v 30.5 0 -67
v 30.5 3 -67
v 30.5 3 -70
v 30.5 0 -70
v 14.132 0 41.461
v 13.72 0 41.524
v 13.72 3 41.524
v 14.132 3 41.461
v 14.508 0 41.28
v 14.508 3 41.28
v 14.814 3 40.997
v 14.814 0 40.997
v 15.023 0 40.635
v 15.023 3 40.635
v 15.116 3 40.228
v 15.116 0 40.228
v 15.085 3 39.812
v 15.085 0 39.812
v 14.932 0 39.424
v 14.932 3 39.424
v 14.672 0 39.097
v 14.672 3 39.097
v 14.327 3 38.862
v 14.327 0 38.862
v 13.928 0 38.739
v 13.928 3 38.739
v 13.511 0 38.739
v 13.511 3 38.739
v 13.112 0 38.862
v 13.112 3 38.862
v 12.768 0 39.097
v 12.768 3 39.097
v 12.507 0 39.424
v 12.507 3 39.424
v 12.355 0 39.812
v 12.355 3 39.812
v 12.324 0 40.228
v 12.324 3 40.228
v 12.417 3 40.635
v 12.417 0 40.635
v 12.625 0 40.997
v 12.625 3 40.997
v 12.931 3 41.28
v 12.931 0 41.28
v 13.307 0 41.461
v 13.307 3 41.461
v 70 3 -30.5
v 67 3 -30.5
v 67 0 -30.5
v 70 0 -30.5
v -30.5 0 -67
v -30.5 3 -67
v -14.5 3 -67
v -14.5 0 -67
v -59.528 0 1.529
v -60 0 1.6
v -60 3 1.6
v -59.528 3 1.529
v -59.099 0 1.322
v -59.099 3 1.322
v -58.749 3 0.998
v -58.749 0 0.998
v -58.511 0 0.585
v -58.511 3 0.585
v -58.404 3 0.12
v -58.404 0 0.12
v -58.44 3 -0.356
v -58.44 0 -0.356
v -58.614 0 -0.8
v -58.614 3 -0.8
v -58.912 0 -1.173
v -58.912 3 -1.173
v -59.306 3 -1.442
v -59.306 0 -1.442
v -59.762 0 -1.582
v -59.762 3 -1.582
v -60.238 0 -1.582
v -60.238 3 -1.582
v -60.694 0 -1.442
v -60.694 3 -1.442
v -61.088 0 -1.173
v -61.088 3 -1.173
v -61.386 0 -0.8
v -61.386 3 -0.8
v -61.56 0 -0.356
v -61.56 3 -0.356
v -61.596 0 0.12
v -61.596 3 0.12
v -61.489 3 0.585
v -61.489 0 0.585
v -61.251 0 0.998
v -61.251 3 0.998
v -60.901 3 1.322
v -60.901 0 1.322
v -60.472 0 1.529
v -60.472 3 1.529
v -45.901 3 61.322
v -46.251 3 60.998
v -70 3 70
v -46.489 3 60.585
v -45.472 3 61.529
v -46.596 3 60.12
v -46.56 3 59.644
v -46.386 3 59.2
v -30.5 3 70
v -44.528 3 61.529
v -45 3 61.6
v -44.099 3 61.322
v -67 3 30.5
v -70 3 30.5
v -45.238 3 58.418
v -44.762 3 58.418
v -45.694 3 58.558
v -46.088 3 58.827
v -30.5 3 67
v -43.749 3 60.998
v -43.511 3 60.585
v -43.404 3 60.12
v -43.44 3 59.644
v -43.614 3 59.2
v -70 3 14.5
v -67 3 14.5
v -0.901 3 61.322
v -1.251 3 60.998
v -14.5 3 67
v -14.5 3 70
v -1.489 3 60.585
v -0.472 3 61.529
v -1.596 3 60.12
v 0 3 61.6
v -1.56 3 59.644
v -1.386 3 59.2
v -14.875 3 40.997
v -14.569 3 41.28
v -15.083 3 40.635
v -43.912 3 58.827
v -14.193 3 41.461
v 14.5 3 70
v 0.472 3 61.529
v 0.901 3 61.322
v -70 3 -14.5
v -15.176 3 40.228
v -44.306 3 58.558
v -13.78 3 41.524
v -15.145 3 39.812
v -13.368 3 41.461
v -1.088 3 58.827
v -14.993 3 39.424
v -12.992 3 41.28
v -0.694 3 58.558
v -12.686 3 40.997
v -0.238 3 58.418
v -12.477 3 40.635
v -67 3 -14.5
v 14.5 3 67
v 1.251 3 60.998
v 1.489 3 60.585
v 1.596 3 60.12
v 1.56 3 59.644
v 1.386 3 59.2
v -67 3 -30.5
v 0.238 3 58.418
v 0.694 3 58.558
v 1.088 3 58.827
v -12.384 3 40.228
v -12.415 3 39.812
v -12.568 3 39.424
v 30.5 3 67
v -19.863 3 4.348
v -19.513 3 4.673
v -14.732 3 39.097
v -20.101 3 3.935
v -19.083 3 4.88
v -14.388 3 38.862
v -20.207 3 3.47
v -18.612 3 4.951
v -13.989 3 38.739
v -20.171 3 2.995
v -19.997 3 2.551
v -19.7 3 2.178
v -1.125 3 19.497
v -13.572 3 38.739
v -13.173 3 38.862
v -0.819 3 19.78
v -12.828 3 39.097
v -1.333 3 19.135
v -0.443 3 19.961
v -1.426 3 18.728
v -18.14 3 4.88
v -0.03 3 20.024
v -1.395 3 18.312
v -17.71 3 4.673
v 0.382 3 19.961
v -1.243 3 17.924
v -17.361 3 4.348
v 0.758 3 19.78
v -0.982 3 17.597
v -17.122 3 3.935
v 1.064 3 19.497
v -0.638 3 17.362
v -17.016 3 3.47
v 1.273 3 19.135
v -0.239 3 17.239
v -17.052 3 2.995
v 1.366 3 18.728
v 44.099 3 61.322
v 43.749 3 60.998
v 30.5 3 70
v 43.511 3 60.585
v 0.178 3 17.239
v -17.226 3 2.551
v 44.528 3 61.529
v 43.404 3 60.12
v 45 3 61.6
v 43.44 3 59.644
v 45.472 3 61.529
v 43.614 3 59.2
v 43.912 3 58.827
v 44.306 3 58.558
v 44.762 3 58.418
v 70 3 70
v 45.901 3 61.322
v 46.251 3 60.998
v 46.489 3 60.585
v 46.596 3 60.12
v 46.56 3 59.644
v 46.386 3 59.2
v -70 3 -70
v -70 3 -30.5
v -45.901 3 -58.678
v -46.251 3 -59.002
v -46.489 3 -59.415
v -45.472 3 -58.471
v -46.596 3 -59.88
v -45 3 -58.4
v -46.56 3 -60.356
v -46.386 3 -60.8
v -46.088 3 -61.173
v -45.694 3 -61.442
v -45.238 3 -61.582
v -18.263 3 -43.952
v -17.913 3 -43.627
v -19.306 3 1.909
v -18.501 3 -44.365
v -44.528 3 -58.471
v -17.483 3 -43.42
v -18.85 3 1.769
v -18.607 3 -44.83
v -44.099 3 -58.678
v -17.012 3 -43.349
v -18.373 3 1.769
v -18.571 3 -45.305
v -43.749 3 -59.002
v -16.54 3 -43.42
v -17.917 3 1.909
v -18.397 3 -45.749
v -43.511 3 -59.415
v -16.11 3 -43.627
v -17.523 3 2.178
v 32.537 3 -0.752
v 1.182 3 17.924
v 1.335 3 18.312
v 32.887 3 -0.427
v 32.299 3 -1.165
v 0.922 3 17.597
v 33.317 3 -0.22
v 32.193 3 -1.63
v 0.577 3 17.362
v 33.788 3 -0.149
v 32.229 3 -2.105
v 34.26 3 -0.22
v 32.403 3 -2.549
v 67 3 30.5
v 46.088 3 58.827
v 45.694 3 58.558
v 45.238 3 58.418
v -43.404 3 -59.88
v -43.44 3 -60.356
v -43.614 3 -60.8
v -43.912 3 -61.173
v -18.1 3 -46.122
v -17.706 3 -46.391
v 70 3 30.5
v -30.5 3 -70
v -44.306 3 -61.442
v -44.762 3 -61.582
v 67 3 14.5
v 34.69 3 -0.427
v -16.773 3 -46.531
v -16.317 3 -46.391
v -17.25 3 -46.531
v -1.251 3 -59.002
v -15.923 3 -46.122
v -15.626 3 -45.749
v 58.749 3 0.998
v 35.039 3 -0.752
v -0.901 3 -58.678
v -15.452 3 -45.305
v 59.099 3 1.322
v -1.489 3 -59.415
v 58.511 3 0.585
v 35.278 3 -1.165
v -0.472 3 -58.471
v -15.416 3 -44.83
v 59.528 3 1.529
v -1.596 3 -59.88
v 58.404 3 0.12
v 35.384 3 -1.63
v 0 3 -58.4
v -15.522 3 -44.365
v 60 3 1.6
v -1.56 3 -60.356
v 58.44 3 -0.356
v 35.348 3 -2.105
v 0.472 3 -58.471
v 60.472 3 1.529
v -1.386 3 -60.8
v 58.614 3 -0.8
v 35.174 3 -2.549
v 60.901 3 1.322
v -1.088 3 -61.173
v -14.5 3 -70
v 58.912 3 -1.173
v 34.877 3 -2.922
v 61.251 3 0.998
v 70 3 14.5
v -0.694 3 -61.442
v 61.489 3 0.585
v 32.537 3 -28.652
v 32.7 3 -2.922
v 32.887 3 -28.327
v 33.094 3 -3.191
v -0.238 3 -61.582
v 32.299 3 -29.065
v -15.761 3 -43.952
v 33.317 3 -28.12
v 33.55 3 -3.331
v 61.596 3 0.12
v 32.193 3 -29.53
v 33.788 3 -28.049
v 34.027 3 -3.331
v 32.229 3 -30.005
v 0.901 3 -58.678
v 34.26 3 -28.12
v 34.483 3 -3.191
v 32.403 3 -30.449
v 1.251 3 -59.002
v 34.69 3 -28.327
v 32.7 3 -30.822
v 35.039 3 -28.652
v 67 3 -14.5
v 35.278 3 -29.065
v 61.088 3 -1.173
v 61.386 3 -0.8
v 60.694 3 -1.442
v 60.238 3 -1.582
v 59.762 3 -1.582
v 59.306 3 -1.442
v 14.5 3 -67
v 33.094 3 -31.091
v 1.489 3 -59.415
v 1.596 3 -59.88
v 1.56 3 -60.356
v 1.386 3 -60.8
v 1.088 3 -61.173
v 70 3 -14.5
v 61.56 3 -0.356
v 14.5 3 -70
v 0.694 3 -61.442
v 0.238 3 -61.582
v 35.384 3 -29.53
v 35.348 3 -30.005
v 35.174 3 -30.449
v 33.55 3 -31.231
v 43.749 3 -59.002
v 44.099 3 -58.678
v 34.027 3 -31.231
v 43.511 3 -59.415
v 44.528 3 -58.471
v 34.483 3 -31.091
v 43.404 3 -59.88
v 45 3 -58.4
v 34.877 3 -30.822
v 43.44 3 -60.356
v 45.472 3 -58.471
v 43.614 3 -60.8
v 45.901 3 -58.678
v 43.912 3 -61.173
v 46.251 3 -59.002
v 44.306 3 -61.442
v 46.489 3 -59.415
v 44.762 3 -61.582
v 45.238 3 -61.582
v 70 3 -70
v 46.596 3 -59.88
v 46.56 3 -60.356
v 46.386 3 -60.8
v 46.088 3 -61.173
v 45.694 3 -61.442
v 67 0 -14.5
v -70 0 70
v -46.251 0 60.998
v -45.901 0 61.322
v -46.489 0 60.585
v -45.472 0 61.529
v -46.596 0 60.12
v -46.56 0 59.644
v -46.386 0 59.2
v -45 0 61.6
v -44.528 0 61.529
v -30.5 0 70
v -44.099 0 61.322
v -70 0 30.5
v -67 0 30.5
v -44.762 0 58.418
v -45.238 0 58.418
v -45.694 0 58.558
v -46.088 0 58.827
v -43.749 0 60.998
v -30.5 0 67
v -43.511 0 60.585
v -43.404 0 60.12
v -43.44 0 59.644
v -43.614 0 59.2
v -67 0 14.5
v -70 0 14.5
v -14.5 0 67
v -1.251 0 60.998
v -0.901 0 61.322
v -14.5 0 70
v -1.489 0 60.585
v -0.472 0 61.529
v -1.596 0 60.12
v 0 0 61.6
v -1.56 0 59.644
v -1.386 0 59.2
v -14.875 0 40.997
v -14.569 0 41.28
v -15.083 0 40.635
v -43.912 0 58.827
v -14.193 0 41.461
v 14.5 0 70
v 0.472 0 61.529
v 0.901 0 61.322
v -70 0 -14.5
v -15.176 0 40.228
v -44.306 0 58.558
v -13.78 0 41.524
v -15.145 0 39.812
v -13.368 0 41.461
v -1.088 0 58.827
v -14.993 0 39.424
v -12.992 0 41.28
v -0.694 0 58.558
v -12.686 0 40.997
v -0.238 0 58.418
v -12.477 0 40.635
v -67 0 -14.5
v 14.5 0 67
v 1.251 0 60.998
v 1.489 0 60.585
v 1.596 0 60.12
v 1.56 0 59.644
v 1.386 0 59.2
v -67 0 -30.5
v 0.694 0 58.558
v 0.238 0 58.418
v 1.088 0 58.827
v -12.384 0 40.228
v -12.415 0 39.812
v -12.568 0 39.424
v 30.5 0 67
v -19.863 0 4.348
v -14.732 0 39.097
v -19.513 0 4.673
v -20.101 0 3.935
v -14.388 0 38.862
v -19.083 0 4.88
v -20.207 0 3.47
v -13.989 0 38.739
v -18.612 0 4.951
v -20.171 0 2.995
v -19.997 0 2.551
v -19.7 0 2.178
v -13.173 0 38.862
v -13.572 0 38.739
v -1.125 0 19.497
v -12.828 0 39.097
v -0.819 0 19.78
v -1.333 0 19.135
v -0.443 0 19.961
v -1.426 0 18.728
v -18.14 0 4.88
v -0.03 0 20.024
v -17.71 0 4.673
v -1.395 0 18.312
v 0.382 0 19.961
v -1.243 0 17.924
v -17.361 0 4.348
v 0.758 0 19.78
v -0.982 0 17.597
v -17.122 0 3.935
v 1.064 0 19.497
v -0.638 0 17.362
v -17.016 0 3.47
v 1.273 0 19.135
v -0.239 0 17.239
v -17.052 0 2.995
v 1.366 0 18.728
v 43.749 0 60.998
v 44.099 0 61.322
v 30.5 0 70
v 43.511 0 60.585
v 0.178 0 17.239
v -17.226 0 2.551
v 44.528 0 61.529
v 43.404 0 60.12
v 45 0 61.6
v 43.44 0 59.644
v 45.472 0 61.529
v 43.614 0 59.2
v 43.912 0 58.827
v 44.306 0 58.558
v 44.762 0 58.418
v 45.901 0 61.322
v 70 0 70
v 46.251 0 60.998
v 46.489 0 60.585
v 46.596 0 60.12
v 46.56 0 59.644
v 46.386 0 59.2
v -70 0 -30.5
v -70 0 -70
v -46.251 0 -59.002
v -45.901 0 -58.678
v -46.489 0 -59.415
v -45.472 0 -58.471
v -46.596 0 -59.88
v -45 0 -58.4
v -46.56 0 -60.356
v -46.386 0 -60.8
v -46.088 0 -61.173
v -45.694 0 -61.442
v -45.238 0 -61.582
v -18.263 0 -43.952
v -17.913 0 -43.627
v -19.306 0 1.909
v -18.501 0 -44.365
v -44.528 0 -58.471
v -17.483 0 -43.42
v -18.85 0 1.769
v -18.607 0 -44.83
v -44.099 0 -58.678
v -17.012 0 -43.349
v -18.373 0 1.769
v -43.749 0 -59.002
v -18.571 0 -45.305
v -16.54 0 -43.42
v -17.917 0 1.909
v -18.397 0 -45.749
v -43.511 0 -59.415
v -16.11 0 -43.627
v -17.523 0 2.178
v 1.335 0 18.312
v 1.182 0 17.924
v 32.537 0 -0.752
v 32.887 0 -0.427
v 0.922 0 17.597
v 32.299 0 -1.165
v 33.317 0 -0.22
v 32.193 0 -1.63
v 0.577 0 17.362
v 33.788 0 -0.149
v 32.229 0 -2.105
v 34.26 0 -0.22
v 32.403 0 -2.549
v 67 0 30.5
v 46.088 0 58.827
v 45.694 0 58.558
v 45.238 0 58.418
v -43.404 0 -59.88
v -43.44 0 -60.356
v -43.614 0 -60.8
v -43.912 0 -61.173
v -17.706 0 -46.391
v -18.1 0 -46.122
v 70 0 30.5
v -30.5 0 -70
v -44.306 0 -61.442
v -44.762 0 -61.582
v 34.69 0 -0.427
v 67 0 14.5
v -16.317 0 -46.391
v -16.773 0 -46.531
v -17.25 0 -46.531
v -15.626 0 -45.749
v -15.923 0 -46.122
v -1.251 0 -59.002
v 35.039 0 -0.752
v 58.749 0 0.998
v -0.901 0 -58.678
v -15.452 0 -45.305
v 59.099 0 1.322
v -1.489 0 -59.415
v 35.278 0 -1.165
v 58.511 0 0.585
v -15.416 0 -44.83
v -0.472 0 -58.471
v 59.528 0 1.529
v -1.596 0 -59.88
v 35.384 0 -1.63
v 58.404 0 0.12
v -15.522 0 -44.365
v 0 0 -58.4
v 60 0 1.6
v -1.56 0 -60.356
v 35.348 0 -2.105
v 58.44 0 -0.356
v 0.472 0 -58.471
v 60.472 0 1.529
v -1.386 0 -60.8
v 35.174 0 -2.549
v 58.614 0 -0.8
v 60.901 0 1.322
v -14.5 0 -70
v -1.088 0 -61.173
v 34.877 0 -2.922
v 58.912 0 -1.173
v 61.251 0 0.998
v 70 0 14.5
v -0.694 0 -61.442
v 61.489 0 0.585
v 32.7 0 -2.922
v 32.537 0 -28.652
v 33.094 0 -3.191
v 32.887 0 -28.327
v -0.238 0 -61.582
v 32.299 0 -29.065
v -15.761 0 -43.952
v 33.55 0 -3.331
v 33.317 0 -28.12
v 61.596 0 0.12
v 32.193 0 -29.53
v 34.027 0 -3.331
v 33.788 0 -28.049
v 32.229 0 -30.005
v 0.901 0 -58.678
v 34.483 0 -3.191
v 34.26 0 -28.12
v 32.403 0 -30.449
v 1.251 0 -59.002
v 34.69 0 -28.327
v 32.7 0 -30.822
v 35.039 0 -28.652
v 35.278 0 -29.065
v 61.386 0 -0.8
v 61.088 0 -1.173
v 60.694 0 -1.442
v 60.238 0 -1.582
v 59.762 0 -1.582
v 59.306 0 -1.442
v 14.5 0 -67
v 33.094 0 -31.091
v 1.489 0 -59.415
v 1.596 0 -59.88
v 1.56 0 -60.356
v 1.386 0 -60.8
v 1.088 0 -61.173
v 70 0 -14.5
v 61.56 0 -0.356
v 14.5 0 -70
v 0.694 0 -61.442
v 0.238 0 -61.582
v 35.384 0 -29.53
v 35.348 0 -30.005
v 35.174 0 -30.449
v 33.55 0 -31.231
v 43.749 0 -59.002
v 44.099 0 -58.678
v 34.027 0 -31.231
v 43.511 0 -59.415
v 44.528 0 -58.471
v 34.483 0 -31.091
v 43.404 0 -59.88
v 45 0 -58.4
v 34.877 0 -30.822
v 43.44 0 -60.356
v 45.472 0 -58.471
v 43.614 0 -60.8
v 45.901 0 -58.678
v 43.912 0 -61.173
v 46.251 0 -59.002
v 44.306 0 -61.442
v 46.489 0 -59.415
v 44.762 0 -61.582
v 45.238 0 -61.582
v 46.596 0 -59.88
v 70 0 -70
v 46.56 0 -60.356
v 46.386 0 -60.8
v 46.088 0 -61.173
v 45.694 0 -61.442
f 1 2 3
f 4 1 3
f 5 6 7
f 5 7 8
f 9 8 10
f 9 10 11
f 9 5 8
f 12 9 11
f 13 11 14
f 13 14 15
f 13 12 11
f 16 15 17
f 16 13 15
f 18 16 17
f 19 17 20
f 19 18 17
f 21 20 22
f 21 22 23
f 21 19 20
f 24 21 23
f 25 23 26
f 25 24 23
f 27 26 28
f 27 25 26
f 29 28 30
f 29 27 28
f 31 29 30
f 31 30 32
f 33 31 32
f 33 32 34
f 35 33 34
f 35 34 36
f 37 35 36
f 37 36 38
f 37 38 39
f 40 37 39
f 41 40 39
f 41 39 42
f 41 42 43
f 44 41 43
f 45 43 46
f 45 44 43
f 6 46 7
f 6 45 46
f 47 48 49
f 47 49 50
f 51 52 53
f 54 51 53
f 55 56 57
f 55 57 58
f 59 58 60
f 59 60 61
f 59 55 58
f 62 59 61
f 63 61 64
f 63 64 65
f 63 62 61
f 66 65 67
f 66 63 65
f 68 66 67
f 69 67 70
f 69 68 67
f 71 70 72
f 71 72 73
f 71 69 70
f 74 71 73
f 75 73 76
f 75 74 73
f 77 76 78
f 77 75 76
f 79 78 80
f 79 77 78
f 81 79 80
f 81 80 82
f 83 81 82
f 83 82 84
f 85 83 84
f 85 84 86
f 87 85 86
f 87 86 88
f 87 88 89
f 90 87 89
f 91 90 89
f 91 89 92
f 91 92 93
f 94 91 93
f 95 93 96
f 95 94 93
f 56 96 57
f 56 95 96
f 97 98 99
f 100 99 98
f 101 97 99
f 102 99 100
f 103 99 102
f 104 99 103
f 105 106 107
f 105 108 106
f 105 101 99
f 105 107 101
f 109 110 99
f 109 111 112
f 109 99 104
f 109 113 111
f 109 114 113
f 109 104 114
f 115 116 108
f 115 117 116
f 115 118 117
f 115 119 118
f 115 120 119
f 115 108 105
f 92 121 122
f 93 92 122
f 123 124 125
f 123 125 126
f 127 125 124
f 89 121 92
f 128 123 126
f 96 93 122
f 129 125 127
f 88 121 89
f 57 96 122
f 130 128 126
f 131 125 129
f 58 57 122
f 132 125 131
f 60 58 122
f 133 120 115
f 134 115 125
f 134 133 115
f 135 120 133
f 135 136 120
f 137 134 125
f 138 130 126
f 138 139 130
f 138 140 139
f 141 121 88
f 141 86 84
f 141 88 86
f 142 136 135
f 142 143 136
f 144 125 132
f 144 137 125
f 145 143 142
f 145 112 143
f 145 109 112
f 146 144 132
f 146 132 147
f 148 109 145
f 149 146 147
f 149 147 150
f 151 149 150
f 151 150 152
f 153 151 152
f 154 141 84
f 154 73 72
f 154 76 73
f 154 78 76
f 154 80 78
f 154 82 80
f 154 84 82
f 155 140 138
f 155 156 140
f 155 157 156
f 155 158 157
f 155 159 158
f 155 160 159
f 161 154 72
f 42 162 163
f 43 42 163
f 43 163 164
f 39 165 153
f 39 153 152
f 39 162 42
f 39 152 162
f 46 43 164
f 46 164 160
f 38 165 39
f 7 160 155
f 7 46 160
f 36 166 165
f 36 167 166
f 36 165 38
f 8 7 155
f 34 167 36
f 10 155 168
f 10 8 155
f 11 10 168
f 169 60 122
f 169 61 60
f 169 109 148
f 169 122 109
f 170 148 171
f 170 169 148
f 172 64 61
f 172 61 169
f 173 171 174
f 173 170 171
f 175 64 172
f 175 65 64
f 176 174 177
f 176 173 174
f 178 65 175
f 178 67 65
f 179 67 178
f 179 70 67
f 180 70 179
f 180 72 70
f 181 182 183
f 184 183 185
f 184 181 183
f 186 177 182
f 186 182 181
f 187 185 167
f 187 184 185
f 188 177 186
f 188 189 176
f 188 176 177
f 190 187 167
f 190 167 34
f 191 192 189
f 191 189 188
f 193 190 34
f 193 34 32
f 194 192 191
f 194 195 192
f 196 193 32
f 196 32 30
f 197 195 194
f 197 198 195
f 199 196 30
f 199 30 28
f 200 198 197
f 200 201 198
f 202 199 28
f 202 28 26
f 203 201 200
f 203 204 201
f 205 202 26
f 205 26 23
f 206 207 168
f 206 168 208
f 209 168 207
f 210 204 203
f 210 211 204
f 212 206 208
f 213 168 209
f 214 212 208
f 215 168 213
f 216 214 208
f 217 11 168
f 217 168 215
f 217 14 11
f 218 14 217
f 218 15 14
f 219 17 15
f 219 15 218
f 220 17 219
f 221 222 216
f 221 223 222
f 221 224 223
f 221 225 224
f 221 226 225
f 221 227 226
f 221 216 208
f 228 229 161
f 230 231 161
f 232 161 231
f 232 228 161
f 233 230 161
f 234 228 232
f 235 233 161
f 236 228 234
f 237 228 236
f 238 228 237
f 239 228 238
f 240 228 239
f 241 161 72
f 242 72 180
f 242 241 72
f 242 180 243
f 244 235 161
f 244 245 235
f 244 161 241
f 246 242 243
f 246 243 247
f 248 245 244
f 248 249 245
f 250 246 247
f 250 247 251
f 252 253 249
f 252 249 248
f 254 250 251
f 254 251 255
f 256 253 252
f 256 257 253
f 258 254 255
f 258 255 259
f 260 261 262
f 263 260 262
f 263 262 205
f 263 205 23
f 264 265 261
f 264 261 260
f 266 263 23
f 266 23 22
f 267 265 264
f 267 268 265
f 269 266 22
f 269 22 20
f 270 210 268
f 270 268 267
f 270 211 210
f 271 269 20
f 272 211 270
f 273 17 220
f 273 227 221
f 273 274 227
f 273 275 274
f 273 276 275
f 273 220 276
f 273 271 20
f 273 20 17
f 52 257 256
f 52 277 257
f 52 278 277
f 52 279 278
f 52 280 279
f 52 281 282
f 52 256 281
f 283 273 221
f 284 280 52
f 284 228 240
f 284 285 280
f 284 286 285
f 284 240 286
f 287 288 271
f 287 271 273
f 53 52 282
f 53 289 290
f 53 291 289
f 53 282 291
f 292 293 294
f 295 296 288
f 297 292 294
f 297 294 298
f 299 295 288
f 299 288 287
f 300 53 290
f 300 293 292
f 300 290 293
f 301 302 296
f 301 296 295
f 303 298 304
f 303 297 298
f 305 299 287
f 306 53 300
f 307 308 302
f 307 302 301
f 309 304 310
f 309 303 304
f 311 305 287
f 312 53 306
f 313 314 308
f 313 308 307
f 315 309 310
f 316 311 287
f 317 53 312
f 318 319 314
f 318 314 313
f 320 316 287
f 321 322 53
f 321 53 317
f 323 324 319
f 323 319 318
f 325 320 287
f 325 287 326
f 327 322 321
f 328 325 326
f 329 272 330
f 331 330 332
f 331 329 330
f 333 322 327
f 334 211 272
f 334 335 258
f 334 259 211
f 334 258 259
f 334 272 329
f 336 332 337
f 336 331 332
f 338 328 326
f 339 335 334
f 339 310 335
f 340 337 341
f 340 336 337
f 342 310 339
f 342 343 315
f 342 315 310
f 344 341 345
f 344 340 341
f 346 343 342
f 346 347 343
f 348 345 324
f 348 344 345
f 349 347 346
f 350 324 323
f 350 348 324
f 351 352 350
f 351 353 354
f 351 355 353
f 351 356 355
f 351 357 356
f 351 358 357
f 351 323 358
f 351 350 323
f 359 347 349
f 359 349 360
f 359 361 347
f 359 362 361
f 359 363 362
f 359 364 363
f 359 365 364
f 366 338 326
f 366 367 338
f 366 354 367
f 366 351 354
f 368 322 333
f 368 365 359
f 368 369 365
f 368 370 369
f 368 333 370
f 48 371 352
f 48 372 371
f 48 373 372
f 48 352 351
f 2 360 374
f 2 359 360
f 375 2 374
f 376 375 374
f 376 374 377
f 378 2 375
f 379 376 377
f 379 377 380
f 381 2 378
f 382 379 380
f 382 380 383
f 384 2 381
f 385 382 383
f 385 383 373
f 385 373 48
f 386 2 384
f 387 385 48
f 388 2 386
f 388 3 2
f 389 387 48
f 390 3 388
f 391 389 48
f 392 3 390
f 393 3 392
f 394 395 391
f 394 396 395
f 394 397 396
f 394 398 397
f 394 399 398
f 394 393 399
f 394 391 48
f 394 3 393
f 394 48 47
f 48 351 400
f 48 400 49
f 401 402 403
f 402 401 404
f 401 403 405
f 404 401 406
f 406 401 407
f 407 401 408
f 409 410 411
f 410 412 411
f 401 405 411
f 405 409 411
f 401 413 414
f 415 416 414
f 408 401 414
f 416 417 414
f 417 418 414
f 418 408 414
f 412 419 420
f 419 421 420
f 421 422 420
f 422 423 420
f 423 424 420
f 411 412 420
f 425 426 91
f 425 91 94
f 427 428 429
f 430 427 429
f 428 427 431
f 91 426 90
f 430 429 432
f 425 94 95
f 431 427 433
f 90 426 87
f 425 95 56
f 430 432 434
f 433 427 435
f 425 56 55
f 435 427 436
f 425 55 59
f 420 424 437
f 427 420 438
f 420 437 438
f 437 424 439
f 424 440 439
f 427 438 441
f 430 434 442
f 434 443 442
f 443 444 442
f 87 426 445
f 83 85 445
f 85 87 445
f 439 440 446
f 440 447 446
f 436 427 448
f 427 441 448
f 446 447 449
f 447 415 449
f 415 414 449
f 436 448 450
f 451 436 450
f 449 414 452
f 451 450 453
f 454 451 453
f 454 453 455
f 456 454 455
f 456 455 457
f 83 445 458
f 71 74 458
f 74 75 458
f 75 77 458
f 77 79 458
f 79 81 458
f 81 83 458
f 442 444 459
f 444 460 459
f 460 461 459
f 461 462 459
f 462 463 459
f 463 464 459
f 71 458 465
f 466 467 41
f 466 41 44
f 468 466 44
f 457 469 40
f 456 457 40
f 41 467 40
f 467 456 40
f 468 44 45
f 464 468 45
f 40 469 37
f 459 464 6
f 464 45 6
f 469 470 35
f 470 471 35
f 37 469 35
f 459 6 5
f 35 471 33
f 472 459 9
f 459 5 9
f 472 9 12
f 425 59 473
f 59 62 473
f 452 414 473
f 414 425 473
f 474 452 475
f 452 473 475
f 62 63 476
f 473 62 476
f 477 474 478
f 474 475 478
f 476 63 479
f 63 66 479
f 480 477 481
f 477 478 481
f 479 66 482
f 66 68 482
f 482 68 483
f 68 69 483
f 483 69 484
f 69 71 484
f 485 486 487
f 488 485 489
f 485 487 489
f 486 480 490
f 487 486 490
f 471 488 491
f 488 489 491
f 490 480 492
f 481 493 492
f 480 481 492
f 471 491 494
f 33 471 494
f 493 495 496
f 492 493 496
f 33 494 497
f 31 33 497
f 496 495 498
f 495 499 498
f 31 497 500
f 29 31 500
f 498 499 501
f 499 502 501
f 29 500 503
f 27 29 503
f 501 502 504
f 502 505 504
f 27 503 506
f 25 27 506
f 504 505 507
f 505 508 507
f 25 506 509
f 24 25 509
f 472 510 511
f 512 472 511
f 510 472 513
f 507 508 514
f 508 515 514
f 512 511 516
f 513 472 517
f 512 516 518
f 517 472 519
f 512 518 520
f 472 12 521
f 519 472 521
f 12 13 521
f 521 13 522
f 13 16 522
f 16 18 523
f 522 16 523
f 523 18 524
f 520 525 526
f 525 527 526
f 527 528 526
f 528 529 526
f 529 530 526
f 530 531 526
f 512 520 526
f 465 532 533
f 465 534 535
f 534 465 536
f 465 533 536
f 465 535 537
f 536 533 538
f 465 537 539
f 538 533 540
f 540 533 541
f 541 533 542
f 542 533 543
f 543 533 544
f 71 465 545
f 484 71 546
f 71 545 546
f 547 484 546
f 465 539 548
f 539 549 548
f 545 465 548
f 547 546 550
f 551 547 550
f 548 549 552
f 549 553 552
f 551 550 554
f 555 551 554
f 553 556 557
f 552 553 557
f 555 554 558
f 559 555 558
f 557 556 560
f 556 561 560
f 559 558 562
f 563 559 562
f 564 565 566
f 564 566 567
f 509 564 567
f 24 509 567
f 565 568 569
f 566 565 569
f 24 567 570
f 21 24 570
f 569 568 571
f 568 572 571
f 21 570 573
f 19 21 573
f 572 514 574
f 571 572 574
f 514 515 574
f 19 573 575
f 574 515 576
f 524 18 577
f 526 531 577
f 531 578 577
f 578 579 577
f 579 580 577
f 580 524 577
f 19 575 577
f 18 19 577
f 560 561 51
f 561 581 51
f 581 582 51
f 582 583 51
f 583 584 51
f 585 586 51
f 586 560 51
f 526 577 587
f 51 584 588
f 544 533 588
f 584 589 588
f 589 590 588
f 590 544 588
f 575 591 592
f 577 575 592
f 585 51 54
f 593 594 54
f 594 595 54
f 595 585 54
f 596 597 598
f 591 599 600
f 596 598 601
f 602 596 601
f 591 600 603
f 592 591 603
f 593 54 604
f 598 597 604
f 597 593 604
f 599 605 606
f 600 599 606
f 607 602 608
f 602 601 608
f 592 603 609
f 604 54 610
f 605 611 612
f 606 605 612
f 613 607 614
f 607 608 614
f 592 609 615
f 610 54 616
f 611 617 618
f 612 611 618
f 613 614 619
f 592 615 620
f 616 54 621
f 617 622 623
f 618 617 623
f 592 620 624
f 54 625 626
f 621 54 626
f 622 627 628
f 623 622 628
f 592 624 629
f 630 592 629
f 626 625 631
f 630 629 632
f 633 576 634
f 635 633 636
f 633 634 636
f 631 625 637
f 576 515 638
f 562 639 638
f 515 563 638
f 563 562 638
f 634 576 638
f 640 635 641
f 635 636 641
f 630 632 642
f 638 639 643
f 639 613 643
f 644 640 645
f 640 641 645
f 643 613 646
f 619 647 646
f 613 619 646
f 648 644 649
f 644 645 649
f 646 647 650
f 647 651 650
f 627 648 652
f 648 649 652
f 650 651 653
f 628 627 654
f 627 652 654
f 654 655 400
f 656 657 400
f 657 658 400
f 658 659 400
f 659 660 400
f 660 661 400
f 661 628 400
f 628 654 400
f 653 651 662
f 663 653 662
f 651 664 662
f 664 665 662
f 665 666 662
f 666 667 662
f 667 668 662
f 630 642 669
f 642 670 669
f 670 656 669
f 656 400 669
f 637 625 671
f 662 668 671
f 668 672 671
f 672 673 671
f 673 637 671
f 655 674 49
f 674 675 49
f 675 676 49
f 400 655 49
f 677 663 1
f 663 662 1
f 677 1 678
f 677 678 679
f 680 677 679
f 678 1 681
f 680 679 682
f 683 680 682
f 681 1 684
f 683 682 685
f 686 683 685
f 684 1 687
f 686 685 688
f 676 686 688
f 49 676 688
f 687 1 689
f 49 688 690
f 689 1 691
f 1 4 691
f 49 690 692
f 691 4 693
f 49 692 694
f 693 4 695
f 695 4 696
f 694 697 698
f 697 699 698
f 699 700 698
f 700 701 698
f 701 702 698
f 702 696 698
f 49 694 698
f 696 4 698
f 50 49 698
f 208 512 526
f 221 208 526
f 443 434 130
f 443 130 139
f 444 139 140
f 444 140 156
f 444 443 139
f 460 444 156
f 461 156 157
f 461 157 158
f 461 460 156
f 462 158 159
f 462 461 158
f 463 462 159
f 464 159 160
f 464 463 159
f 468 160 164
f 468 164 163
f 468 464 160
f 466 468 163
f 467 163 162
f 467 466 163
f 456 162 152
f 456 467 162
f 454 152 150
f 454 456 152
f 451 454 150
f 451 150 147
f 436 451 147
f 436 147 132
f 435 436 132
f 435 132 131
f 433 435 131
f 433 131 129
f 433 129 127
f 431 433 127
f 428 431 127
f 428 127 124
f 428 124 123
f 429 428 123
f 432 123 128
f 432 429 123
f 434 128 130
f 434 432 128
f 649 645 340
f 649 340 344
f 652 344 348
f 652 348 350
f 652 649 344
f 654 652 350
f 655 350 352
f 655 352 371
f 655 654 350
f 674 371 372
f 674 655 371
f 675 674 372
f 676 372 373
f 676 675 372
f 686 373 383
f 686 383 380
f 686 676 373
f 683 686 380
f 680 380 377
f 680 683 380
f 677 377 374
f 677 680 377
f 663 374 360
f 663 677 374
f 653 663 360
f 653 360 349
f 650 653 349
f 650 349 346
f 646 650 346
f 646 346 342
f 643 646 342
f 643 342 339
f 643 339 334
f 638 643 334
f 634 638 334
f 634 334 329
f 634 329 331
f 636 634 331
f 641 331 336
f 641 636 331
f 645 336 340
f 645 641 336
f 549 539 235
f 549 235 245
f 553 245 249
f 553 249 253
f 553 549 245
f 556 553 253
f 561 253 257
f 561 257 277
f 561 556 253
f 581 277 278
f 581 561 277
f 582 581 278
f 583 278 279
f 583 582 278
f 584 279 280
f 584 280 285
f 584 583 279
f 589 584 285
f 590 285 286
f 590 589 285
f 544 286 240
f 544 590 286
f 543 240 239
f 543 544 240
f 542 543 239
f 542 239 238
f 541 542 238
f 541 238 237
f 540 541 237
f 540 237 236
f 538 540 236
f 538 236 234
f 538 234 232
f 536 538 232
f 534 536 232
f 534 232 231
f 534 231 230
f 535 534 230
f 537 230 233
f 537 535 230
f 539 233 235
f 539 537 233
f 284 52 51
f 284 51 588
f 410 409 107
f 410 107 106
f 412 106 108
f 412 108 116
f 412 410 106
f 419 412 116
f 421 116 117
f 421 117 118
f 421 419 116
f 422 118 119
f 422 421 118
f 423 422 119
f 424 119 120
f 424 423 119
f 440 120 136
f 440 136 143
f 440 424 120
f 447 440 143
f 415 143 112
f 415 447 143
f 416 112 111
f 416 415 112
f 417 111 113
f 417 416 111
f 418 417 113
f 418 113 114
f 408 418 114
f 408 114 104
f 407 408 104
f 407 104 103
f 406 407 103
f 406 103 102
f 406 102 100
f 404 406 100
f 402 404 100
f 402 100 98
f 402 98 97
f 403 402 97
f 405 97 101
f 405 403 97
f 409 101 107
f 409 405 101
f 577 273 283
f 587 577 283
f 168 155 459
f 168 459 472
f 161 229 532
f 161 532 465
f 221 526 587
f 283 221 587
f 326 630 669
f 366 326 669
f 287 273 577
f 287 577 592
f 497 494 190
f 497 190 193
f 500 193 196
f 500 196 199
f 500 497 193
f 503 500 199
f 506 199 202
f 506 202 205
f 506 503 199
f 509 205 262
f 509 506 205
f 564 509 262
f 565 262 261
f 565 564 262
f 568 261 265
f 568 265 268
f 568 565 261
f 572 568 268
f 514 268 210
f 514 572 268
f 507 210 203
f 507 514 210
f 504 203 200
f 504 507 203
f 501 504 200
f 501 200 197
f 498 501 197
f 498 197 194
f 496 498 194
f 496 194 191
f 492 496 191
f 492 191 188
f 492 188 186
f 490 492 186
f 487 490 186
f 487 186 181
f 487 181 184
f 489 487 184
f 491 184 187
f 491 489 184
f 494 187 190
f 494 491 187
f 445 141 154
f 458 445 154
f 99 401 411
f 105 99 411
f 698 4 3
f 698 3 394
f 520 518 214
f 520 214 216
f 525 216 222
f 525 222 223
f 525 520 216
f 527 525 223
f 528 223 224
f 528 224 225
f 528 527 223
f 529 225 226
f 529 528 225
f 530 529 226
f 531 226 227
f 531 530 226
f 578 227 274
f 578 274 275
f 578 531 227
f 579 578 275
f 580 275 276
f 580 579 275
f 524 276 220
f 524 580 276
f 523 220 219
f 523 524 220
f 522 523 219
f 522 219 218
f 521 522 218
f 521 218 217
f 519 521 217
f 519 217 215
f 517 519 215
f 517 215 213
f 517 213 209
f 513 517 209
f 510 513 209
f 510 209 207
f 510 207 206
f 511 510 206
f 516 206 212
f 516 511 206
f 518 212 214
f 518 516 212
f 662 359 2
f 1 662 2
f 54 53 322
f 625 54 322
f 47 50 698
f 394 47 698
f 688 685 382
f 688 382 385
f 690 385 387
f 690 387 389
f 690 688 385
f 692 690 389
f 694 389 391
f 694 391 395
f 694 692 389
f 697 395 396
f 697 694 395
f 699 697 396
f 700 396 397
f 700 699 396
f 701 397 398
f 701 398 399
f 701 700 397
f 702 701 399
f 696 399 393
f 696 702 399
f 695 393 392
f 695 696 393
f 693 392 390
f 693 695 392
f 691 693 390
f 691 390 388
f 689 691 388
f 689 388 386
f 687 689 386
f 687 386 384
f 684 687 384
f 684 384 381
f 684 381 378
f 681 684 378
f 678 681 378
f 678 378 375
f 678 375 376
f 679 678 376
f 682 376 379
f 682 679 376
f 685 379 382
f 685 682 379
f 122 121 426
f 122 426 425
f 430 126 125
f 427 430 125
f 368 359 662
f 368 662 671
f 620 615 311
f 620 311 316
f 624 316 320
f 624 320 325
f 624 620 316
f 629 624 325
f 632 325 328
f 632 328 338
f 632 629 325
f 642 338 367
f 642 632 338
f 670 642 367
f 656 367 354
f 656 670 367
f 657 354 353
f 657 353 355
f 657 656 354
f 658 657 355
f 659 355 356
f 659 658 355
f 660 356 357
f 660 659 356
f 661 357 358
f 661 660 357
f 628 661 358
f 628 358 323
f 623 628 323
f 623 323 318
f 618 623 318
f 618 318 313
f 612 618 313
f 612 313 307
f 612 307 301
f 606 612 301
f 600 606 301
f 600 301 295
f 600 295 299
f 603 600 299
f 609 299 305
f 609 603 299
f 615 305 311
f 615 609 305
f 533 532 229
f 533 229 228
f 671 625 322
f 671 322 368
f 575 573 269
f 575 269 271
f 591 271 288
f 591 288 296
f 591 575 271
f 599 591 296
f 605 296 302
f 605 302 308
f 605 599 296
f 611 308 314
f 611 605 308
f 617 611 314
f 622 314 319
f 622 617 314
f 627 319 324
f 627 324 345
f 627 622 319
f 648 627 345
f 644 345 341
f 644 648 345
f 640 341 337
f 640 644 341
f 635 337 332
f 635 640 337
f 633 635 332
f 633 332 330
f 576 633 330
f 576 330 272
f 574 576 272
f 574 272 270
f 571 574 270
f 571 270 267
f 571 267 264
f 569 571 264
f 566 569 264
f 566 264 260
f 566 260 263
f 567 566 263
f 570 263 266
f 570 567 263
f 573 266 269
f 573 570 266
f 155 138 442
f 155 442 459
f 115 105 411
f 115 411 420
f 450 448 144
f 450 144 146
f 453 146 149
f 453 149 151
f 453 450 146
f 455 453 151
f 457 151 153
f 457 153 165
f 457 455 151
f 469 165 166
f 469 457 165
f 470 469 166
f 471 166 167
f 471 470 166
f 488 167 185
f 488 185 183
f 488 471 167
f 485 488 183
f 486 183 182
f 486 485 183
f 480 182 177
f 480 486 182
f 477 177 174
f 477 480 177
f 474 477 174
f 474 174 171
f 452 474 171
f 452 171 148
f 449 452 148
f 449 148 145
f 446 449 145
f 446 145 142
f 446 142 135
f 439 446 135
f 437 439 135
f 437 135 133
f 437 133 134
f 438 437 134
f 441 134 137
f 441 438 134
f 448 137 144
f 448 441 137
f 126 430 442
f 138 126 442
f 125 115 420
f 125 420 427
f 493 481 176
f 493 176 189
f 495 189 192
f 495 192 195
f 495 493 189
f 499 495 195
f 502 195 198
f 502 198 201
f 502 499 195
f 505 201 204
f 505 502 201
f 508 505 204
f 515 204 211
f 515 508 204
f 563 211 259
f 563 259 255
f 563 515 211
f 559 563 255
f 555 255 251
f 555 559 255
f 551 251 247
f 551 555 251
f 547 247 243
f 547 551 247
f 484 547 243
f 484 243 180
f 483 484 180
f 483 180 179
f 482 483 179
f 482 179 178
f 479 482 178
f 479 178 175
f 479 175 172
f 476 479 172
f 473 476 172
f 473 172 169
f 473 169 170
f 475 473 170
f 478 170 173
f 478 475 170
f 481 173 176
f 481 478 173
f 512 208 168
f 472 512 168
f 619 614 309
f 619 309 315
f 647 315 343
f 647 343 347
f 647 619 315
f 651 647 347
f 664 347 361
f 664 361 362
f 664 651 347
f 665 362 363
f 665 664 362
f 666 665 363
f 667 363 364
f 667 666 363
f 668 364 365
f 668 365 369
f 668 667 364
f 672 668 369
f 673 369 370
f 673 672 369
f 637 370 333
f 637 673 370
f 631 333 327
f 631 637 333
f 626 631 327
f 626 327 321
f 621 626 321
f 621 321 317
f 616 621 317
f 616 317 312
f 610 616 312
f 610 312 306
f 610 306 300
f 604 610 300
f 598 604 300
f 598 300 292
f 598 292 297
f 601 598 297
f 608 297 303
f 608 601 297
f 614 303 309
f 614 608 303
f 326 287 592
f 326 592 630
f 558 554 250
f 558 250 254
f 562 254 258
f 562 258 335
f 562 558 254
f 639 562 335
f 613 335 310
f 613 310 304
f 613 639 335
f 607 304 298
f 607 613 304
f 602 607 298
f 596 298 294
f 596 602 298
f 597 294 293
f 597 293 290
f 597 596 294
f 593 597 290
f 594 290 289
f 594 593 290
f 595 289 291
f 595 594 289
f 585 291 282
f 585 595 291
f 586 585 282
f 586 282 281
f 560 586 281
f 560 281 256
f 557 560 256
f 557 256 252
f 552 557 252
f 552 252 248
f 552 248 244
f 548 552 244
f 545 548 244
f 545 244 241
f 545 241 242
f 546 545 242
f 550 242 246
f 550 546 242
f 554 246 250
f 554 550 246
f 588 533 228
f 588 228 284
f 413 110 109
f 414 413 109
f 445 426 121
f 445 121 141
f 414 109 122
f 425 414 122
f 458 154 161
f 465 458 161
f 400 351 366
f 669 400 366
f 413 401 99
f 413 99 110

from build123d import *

# Parameters (mm, degrees)
SKETCH2_W           = 140
SKETCH2_H           = 140
SKETCH2_R           = 1.6
SKETCH2_R_2         = 1.4
BOSS_EXTRUDE2_DEPTH = 3
SKETCH3_W           = 16
SKETCH3_H           = 3
SKETCH3_W_2         = 3
SKETCH3_H_2         = 16
CUT_EXTRUDE2_DEPTH  = 3


with BuildPart() as part:
    # Sketch2 → Boss-Extrude2 (new body)
    with BuildSketch(Plane(origin=(0, 0, 0), x_dir=(1, 0, 0), z_dir=(0, 1, 0))):
        Rectangle(SKETCH2_W, SKETCH2_H)
        with Locations(Location((-17.011581703, 44.949159058, 0), (0, 0, 270))):
            Circle(SKETCH2_R, mode=Mode.SUBTRACT)
        with Locations(Location((-18.611581703, -3.350840942, 0), (0, 0, 270))):
            Circle(SKETCH2_R, mode=Mode.SUBTRACT)
        with Locations(Location((33.788418297, 29.649159058, 0), (0, 0, 270))):
            Circle(SKETCH2_R, mode=Mode.SUBTRACT)
        with Locations(Location((33.788418297, 1.749159058, 0), (0, 0, 270))):
            Circle(SKETCH2_R, mode=Mode.SUBTRACT)
        with Locations(Location((0, 60, 0), (0, 0, 270))):
            Circle(SKETCH2_R, mode=Mode.SUBTRACT)
        with Locations(Location((-60, 0, 0), (0, 0, 270))):
            Circle(SKETCH2_R, mode=Mode.SUBTRACT)
        with Locations(Location((0, -60, 0), (0, 0, 270))):
            Circle(SKETCH2_R, mode=Mode.SUBTRACT)
        with Locations(Location((60, 0, 0), (0, 0, 270))):
            Circle(SKETCH2_R, mode=Mode.SUBTRACT)
        with Locations(Location((-45, 60, 0), (0, 0, 270))):
            Circle(SKETCH2_R, mode=Mode.SUBTRACT)
        with Locations(Location((45, 60, 0), (0, 0, 270))):
            Circle(SKETCH2_R, mode=Mode.SUBTRACT)
        with Locations(Location((-45, -60, 0), (0, 0, 270))):
            Circle(SKETCH2_R, mode=Mode.SUBTRACT)
        with Locations(Location((45, -60, 0), (0, 0, 270))):
            Circle(SKETCH2_R, mode=Mode.SUBTRACT)
        with Locations(Location((-0.030225379, -18.62367845, 0), (0, 0, 270))):
            Circle(SKETCH2_R_2, mode=Mode.SUBTRACT)
        with Locations(Location((-13.780225379, -40.12367845, 0), (0, 0, 270))):
            Circle(SKETCH2_R_2, mode=Mode.SUBTRACT)
        with Locations(Location((13.719774621, -40.12367845, 0), (0, 0, 270))):
            Circle(SKETCH2_R_2, mode=Mode.SUBTRACT)
    extrude(amount=BOSS_EXTRUDE2_DEPTH)

    # Sketch3 → Cut-Extrude2 (cut)
    with BuildSketch(Plane(origin=(0, 3, 0), x_dir=(1, 0, 0), z_dir=(0, 1, 0))):
        with Locations((-22.5, 68.5)):
            Rectangle(SKETCH3_W, SKETCH3_H)
        with Locations((-22.5, -68.5)):
            Rectangle(SKETCH3_W, SKETCH3_H)
        with Locations((22.5, -68.5)):
            Rectangle(SKETCH3_W, SKETCH3_H)
        with Locations((22.5, 68.5)):
            Rectangle(SKETCH3_W, SKETCH3_H)
        with Locations((-68.5, 22.5)):
            Rectangle(SKETCH3_W_2, SKETCH3_H_2)
        with Locations((68.5, 22.5)):
            Rectangle(SKETCH3_W_2, SKETCH3_H_2)
        with Locations((68.5, -22.5)):
            Rectangle(SKETCH3_W_2, SKETCH3_H_2)
        with Locations((-68.5, -22.5)):
            Rectangle(SKETCH3_W_2, SKETCH3_H_2)
    extrude(amount=-CUT_EXTRUDE2_DEPTH, mode=Mode.SUBTRACT)


solid = part.part
